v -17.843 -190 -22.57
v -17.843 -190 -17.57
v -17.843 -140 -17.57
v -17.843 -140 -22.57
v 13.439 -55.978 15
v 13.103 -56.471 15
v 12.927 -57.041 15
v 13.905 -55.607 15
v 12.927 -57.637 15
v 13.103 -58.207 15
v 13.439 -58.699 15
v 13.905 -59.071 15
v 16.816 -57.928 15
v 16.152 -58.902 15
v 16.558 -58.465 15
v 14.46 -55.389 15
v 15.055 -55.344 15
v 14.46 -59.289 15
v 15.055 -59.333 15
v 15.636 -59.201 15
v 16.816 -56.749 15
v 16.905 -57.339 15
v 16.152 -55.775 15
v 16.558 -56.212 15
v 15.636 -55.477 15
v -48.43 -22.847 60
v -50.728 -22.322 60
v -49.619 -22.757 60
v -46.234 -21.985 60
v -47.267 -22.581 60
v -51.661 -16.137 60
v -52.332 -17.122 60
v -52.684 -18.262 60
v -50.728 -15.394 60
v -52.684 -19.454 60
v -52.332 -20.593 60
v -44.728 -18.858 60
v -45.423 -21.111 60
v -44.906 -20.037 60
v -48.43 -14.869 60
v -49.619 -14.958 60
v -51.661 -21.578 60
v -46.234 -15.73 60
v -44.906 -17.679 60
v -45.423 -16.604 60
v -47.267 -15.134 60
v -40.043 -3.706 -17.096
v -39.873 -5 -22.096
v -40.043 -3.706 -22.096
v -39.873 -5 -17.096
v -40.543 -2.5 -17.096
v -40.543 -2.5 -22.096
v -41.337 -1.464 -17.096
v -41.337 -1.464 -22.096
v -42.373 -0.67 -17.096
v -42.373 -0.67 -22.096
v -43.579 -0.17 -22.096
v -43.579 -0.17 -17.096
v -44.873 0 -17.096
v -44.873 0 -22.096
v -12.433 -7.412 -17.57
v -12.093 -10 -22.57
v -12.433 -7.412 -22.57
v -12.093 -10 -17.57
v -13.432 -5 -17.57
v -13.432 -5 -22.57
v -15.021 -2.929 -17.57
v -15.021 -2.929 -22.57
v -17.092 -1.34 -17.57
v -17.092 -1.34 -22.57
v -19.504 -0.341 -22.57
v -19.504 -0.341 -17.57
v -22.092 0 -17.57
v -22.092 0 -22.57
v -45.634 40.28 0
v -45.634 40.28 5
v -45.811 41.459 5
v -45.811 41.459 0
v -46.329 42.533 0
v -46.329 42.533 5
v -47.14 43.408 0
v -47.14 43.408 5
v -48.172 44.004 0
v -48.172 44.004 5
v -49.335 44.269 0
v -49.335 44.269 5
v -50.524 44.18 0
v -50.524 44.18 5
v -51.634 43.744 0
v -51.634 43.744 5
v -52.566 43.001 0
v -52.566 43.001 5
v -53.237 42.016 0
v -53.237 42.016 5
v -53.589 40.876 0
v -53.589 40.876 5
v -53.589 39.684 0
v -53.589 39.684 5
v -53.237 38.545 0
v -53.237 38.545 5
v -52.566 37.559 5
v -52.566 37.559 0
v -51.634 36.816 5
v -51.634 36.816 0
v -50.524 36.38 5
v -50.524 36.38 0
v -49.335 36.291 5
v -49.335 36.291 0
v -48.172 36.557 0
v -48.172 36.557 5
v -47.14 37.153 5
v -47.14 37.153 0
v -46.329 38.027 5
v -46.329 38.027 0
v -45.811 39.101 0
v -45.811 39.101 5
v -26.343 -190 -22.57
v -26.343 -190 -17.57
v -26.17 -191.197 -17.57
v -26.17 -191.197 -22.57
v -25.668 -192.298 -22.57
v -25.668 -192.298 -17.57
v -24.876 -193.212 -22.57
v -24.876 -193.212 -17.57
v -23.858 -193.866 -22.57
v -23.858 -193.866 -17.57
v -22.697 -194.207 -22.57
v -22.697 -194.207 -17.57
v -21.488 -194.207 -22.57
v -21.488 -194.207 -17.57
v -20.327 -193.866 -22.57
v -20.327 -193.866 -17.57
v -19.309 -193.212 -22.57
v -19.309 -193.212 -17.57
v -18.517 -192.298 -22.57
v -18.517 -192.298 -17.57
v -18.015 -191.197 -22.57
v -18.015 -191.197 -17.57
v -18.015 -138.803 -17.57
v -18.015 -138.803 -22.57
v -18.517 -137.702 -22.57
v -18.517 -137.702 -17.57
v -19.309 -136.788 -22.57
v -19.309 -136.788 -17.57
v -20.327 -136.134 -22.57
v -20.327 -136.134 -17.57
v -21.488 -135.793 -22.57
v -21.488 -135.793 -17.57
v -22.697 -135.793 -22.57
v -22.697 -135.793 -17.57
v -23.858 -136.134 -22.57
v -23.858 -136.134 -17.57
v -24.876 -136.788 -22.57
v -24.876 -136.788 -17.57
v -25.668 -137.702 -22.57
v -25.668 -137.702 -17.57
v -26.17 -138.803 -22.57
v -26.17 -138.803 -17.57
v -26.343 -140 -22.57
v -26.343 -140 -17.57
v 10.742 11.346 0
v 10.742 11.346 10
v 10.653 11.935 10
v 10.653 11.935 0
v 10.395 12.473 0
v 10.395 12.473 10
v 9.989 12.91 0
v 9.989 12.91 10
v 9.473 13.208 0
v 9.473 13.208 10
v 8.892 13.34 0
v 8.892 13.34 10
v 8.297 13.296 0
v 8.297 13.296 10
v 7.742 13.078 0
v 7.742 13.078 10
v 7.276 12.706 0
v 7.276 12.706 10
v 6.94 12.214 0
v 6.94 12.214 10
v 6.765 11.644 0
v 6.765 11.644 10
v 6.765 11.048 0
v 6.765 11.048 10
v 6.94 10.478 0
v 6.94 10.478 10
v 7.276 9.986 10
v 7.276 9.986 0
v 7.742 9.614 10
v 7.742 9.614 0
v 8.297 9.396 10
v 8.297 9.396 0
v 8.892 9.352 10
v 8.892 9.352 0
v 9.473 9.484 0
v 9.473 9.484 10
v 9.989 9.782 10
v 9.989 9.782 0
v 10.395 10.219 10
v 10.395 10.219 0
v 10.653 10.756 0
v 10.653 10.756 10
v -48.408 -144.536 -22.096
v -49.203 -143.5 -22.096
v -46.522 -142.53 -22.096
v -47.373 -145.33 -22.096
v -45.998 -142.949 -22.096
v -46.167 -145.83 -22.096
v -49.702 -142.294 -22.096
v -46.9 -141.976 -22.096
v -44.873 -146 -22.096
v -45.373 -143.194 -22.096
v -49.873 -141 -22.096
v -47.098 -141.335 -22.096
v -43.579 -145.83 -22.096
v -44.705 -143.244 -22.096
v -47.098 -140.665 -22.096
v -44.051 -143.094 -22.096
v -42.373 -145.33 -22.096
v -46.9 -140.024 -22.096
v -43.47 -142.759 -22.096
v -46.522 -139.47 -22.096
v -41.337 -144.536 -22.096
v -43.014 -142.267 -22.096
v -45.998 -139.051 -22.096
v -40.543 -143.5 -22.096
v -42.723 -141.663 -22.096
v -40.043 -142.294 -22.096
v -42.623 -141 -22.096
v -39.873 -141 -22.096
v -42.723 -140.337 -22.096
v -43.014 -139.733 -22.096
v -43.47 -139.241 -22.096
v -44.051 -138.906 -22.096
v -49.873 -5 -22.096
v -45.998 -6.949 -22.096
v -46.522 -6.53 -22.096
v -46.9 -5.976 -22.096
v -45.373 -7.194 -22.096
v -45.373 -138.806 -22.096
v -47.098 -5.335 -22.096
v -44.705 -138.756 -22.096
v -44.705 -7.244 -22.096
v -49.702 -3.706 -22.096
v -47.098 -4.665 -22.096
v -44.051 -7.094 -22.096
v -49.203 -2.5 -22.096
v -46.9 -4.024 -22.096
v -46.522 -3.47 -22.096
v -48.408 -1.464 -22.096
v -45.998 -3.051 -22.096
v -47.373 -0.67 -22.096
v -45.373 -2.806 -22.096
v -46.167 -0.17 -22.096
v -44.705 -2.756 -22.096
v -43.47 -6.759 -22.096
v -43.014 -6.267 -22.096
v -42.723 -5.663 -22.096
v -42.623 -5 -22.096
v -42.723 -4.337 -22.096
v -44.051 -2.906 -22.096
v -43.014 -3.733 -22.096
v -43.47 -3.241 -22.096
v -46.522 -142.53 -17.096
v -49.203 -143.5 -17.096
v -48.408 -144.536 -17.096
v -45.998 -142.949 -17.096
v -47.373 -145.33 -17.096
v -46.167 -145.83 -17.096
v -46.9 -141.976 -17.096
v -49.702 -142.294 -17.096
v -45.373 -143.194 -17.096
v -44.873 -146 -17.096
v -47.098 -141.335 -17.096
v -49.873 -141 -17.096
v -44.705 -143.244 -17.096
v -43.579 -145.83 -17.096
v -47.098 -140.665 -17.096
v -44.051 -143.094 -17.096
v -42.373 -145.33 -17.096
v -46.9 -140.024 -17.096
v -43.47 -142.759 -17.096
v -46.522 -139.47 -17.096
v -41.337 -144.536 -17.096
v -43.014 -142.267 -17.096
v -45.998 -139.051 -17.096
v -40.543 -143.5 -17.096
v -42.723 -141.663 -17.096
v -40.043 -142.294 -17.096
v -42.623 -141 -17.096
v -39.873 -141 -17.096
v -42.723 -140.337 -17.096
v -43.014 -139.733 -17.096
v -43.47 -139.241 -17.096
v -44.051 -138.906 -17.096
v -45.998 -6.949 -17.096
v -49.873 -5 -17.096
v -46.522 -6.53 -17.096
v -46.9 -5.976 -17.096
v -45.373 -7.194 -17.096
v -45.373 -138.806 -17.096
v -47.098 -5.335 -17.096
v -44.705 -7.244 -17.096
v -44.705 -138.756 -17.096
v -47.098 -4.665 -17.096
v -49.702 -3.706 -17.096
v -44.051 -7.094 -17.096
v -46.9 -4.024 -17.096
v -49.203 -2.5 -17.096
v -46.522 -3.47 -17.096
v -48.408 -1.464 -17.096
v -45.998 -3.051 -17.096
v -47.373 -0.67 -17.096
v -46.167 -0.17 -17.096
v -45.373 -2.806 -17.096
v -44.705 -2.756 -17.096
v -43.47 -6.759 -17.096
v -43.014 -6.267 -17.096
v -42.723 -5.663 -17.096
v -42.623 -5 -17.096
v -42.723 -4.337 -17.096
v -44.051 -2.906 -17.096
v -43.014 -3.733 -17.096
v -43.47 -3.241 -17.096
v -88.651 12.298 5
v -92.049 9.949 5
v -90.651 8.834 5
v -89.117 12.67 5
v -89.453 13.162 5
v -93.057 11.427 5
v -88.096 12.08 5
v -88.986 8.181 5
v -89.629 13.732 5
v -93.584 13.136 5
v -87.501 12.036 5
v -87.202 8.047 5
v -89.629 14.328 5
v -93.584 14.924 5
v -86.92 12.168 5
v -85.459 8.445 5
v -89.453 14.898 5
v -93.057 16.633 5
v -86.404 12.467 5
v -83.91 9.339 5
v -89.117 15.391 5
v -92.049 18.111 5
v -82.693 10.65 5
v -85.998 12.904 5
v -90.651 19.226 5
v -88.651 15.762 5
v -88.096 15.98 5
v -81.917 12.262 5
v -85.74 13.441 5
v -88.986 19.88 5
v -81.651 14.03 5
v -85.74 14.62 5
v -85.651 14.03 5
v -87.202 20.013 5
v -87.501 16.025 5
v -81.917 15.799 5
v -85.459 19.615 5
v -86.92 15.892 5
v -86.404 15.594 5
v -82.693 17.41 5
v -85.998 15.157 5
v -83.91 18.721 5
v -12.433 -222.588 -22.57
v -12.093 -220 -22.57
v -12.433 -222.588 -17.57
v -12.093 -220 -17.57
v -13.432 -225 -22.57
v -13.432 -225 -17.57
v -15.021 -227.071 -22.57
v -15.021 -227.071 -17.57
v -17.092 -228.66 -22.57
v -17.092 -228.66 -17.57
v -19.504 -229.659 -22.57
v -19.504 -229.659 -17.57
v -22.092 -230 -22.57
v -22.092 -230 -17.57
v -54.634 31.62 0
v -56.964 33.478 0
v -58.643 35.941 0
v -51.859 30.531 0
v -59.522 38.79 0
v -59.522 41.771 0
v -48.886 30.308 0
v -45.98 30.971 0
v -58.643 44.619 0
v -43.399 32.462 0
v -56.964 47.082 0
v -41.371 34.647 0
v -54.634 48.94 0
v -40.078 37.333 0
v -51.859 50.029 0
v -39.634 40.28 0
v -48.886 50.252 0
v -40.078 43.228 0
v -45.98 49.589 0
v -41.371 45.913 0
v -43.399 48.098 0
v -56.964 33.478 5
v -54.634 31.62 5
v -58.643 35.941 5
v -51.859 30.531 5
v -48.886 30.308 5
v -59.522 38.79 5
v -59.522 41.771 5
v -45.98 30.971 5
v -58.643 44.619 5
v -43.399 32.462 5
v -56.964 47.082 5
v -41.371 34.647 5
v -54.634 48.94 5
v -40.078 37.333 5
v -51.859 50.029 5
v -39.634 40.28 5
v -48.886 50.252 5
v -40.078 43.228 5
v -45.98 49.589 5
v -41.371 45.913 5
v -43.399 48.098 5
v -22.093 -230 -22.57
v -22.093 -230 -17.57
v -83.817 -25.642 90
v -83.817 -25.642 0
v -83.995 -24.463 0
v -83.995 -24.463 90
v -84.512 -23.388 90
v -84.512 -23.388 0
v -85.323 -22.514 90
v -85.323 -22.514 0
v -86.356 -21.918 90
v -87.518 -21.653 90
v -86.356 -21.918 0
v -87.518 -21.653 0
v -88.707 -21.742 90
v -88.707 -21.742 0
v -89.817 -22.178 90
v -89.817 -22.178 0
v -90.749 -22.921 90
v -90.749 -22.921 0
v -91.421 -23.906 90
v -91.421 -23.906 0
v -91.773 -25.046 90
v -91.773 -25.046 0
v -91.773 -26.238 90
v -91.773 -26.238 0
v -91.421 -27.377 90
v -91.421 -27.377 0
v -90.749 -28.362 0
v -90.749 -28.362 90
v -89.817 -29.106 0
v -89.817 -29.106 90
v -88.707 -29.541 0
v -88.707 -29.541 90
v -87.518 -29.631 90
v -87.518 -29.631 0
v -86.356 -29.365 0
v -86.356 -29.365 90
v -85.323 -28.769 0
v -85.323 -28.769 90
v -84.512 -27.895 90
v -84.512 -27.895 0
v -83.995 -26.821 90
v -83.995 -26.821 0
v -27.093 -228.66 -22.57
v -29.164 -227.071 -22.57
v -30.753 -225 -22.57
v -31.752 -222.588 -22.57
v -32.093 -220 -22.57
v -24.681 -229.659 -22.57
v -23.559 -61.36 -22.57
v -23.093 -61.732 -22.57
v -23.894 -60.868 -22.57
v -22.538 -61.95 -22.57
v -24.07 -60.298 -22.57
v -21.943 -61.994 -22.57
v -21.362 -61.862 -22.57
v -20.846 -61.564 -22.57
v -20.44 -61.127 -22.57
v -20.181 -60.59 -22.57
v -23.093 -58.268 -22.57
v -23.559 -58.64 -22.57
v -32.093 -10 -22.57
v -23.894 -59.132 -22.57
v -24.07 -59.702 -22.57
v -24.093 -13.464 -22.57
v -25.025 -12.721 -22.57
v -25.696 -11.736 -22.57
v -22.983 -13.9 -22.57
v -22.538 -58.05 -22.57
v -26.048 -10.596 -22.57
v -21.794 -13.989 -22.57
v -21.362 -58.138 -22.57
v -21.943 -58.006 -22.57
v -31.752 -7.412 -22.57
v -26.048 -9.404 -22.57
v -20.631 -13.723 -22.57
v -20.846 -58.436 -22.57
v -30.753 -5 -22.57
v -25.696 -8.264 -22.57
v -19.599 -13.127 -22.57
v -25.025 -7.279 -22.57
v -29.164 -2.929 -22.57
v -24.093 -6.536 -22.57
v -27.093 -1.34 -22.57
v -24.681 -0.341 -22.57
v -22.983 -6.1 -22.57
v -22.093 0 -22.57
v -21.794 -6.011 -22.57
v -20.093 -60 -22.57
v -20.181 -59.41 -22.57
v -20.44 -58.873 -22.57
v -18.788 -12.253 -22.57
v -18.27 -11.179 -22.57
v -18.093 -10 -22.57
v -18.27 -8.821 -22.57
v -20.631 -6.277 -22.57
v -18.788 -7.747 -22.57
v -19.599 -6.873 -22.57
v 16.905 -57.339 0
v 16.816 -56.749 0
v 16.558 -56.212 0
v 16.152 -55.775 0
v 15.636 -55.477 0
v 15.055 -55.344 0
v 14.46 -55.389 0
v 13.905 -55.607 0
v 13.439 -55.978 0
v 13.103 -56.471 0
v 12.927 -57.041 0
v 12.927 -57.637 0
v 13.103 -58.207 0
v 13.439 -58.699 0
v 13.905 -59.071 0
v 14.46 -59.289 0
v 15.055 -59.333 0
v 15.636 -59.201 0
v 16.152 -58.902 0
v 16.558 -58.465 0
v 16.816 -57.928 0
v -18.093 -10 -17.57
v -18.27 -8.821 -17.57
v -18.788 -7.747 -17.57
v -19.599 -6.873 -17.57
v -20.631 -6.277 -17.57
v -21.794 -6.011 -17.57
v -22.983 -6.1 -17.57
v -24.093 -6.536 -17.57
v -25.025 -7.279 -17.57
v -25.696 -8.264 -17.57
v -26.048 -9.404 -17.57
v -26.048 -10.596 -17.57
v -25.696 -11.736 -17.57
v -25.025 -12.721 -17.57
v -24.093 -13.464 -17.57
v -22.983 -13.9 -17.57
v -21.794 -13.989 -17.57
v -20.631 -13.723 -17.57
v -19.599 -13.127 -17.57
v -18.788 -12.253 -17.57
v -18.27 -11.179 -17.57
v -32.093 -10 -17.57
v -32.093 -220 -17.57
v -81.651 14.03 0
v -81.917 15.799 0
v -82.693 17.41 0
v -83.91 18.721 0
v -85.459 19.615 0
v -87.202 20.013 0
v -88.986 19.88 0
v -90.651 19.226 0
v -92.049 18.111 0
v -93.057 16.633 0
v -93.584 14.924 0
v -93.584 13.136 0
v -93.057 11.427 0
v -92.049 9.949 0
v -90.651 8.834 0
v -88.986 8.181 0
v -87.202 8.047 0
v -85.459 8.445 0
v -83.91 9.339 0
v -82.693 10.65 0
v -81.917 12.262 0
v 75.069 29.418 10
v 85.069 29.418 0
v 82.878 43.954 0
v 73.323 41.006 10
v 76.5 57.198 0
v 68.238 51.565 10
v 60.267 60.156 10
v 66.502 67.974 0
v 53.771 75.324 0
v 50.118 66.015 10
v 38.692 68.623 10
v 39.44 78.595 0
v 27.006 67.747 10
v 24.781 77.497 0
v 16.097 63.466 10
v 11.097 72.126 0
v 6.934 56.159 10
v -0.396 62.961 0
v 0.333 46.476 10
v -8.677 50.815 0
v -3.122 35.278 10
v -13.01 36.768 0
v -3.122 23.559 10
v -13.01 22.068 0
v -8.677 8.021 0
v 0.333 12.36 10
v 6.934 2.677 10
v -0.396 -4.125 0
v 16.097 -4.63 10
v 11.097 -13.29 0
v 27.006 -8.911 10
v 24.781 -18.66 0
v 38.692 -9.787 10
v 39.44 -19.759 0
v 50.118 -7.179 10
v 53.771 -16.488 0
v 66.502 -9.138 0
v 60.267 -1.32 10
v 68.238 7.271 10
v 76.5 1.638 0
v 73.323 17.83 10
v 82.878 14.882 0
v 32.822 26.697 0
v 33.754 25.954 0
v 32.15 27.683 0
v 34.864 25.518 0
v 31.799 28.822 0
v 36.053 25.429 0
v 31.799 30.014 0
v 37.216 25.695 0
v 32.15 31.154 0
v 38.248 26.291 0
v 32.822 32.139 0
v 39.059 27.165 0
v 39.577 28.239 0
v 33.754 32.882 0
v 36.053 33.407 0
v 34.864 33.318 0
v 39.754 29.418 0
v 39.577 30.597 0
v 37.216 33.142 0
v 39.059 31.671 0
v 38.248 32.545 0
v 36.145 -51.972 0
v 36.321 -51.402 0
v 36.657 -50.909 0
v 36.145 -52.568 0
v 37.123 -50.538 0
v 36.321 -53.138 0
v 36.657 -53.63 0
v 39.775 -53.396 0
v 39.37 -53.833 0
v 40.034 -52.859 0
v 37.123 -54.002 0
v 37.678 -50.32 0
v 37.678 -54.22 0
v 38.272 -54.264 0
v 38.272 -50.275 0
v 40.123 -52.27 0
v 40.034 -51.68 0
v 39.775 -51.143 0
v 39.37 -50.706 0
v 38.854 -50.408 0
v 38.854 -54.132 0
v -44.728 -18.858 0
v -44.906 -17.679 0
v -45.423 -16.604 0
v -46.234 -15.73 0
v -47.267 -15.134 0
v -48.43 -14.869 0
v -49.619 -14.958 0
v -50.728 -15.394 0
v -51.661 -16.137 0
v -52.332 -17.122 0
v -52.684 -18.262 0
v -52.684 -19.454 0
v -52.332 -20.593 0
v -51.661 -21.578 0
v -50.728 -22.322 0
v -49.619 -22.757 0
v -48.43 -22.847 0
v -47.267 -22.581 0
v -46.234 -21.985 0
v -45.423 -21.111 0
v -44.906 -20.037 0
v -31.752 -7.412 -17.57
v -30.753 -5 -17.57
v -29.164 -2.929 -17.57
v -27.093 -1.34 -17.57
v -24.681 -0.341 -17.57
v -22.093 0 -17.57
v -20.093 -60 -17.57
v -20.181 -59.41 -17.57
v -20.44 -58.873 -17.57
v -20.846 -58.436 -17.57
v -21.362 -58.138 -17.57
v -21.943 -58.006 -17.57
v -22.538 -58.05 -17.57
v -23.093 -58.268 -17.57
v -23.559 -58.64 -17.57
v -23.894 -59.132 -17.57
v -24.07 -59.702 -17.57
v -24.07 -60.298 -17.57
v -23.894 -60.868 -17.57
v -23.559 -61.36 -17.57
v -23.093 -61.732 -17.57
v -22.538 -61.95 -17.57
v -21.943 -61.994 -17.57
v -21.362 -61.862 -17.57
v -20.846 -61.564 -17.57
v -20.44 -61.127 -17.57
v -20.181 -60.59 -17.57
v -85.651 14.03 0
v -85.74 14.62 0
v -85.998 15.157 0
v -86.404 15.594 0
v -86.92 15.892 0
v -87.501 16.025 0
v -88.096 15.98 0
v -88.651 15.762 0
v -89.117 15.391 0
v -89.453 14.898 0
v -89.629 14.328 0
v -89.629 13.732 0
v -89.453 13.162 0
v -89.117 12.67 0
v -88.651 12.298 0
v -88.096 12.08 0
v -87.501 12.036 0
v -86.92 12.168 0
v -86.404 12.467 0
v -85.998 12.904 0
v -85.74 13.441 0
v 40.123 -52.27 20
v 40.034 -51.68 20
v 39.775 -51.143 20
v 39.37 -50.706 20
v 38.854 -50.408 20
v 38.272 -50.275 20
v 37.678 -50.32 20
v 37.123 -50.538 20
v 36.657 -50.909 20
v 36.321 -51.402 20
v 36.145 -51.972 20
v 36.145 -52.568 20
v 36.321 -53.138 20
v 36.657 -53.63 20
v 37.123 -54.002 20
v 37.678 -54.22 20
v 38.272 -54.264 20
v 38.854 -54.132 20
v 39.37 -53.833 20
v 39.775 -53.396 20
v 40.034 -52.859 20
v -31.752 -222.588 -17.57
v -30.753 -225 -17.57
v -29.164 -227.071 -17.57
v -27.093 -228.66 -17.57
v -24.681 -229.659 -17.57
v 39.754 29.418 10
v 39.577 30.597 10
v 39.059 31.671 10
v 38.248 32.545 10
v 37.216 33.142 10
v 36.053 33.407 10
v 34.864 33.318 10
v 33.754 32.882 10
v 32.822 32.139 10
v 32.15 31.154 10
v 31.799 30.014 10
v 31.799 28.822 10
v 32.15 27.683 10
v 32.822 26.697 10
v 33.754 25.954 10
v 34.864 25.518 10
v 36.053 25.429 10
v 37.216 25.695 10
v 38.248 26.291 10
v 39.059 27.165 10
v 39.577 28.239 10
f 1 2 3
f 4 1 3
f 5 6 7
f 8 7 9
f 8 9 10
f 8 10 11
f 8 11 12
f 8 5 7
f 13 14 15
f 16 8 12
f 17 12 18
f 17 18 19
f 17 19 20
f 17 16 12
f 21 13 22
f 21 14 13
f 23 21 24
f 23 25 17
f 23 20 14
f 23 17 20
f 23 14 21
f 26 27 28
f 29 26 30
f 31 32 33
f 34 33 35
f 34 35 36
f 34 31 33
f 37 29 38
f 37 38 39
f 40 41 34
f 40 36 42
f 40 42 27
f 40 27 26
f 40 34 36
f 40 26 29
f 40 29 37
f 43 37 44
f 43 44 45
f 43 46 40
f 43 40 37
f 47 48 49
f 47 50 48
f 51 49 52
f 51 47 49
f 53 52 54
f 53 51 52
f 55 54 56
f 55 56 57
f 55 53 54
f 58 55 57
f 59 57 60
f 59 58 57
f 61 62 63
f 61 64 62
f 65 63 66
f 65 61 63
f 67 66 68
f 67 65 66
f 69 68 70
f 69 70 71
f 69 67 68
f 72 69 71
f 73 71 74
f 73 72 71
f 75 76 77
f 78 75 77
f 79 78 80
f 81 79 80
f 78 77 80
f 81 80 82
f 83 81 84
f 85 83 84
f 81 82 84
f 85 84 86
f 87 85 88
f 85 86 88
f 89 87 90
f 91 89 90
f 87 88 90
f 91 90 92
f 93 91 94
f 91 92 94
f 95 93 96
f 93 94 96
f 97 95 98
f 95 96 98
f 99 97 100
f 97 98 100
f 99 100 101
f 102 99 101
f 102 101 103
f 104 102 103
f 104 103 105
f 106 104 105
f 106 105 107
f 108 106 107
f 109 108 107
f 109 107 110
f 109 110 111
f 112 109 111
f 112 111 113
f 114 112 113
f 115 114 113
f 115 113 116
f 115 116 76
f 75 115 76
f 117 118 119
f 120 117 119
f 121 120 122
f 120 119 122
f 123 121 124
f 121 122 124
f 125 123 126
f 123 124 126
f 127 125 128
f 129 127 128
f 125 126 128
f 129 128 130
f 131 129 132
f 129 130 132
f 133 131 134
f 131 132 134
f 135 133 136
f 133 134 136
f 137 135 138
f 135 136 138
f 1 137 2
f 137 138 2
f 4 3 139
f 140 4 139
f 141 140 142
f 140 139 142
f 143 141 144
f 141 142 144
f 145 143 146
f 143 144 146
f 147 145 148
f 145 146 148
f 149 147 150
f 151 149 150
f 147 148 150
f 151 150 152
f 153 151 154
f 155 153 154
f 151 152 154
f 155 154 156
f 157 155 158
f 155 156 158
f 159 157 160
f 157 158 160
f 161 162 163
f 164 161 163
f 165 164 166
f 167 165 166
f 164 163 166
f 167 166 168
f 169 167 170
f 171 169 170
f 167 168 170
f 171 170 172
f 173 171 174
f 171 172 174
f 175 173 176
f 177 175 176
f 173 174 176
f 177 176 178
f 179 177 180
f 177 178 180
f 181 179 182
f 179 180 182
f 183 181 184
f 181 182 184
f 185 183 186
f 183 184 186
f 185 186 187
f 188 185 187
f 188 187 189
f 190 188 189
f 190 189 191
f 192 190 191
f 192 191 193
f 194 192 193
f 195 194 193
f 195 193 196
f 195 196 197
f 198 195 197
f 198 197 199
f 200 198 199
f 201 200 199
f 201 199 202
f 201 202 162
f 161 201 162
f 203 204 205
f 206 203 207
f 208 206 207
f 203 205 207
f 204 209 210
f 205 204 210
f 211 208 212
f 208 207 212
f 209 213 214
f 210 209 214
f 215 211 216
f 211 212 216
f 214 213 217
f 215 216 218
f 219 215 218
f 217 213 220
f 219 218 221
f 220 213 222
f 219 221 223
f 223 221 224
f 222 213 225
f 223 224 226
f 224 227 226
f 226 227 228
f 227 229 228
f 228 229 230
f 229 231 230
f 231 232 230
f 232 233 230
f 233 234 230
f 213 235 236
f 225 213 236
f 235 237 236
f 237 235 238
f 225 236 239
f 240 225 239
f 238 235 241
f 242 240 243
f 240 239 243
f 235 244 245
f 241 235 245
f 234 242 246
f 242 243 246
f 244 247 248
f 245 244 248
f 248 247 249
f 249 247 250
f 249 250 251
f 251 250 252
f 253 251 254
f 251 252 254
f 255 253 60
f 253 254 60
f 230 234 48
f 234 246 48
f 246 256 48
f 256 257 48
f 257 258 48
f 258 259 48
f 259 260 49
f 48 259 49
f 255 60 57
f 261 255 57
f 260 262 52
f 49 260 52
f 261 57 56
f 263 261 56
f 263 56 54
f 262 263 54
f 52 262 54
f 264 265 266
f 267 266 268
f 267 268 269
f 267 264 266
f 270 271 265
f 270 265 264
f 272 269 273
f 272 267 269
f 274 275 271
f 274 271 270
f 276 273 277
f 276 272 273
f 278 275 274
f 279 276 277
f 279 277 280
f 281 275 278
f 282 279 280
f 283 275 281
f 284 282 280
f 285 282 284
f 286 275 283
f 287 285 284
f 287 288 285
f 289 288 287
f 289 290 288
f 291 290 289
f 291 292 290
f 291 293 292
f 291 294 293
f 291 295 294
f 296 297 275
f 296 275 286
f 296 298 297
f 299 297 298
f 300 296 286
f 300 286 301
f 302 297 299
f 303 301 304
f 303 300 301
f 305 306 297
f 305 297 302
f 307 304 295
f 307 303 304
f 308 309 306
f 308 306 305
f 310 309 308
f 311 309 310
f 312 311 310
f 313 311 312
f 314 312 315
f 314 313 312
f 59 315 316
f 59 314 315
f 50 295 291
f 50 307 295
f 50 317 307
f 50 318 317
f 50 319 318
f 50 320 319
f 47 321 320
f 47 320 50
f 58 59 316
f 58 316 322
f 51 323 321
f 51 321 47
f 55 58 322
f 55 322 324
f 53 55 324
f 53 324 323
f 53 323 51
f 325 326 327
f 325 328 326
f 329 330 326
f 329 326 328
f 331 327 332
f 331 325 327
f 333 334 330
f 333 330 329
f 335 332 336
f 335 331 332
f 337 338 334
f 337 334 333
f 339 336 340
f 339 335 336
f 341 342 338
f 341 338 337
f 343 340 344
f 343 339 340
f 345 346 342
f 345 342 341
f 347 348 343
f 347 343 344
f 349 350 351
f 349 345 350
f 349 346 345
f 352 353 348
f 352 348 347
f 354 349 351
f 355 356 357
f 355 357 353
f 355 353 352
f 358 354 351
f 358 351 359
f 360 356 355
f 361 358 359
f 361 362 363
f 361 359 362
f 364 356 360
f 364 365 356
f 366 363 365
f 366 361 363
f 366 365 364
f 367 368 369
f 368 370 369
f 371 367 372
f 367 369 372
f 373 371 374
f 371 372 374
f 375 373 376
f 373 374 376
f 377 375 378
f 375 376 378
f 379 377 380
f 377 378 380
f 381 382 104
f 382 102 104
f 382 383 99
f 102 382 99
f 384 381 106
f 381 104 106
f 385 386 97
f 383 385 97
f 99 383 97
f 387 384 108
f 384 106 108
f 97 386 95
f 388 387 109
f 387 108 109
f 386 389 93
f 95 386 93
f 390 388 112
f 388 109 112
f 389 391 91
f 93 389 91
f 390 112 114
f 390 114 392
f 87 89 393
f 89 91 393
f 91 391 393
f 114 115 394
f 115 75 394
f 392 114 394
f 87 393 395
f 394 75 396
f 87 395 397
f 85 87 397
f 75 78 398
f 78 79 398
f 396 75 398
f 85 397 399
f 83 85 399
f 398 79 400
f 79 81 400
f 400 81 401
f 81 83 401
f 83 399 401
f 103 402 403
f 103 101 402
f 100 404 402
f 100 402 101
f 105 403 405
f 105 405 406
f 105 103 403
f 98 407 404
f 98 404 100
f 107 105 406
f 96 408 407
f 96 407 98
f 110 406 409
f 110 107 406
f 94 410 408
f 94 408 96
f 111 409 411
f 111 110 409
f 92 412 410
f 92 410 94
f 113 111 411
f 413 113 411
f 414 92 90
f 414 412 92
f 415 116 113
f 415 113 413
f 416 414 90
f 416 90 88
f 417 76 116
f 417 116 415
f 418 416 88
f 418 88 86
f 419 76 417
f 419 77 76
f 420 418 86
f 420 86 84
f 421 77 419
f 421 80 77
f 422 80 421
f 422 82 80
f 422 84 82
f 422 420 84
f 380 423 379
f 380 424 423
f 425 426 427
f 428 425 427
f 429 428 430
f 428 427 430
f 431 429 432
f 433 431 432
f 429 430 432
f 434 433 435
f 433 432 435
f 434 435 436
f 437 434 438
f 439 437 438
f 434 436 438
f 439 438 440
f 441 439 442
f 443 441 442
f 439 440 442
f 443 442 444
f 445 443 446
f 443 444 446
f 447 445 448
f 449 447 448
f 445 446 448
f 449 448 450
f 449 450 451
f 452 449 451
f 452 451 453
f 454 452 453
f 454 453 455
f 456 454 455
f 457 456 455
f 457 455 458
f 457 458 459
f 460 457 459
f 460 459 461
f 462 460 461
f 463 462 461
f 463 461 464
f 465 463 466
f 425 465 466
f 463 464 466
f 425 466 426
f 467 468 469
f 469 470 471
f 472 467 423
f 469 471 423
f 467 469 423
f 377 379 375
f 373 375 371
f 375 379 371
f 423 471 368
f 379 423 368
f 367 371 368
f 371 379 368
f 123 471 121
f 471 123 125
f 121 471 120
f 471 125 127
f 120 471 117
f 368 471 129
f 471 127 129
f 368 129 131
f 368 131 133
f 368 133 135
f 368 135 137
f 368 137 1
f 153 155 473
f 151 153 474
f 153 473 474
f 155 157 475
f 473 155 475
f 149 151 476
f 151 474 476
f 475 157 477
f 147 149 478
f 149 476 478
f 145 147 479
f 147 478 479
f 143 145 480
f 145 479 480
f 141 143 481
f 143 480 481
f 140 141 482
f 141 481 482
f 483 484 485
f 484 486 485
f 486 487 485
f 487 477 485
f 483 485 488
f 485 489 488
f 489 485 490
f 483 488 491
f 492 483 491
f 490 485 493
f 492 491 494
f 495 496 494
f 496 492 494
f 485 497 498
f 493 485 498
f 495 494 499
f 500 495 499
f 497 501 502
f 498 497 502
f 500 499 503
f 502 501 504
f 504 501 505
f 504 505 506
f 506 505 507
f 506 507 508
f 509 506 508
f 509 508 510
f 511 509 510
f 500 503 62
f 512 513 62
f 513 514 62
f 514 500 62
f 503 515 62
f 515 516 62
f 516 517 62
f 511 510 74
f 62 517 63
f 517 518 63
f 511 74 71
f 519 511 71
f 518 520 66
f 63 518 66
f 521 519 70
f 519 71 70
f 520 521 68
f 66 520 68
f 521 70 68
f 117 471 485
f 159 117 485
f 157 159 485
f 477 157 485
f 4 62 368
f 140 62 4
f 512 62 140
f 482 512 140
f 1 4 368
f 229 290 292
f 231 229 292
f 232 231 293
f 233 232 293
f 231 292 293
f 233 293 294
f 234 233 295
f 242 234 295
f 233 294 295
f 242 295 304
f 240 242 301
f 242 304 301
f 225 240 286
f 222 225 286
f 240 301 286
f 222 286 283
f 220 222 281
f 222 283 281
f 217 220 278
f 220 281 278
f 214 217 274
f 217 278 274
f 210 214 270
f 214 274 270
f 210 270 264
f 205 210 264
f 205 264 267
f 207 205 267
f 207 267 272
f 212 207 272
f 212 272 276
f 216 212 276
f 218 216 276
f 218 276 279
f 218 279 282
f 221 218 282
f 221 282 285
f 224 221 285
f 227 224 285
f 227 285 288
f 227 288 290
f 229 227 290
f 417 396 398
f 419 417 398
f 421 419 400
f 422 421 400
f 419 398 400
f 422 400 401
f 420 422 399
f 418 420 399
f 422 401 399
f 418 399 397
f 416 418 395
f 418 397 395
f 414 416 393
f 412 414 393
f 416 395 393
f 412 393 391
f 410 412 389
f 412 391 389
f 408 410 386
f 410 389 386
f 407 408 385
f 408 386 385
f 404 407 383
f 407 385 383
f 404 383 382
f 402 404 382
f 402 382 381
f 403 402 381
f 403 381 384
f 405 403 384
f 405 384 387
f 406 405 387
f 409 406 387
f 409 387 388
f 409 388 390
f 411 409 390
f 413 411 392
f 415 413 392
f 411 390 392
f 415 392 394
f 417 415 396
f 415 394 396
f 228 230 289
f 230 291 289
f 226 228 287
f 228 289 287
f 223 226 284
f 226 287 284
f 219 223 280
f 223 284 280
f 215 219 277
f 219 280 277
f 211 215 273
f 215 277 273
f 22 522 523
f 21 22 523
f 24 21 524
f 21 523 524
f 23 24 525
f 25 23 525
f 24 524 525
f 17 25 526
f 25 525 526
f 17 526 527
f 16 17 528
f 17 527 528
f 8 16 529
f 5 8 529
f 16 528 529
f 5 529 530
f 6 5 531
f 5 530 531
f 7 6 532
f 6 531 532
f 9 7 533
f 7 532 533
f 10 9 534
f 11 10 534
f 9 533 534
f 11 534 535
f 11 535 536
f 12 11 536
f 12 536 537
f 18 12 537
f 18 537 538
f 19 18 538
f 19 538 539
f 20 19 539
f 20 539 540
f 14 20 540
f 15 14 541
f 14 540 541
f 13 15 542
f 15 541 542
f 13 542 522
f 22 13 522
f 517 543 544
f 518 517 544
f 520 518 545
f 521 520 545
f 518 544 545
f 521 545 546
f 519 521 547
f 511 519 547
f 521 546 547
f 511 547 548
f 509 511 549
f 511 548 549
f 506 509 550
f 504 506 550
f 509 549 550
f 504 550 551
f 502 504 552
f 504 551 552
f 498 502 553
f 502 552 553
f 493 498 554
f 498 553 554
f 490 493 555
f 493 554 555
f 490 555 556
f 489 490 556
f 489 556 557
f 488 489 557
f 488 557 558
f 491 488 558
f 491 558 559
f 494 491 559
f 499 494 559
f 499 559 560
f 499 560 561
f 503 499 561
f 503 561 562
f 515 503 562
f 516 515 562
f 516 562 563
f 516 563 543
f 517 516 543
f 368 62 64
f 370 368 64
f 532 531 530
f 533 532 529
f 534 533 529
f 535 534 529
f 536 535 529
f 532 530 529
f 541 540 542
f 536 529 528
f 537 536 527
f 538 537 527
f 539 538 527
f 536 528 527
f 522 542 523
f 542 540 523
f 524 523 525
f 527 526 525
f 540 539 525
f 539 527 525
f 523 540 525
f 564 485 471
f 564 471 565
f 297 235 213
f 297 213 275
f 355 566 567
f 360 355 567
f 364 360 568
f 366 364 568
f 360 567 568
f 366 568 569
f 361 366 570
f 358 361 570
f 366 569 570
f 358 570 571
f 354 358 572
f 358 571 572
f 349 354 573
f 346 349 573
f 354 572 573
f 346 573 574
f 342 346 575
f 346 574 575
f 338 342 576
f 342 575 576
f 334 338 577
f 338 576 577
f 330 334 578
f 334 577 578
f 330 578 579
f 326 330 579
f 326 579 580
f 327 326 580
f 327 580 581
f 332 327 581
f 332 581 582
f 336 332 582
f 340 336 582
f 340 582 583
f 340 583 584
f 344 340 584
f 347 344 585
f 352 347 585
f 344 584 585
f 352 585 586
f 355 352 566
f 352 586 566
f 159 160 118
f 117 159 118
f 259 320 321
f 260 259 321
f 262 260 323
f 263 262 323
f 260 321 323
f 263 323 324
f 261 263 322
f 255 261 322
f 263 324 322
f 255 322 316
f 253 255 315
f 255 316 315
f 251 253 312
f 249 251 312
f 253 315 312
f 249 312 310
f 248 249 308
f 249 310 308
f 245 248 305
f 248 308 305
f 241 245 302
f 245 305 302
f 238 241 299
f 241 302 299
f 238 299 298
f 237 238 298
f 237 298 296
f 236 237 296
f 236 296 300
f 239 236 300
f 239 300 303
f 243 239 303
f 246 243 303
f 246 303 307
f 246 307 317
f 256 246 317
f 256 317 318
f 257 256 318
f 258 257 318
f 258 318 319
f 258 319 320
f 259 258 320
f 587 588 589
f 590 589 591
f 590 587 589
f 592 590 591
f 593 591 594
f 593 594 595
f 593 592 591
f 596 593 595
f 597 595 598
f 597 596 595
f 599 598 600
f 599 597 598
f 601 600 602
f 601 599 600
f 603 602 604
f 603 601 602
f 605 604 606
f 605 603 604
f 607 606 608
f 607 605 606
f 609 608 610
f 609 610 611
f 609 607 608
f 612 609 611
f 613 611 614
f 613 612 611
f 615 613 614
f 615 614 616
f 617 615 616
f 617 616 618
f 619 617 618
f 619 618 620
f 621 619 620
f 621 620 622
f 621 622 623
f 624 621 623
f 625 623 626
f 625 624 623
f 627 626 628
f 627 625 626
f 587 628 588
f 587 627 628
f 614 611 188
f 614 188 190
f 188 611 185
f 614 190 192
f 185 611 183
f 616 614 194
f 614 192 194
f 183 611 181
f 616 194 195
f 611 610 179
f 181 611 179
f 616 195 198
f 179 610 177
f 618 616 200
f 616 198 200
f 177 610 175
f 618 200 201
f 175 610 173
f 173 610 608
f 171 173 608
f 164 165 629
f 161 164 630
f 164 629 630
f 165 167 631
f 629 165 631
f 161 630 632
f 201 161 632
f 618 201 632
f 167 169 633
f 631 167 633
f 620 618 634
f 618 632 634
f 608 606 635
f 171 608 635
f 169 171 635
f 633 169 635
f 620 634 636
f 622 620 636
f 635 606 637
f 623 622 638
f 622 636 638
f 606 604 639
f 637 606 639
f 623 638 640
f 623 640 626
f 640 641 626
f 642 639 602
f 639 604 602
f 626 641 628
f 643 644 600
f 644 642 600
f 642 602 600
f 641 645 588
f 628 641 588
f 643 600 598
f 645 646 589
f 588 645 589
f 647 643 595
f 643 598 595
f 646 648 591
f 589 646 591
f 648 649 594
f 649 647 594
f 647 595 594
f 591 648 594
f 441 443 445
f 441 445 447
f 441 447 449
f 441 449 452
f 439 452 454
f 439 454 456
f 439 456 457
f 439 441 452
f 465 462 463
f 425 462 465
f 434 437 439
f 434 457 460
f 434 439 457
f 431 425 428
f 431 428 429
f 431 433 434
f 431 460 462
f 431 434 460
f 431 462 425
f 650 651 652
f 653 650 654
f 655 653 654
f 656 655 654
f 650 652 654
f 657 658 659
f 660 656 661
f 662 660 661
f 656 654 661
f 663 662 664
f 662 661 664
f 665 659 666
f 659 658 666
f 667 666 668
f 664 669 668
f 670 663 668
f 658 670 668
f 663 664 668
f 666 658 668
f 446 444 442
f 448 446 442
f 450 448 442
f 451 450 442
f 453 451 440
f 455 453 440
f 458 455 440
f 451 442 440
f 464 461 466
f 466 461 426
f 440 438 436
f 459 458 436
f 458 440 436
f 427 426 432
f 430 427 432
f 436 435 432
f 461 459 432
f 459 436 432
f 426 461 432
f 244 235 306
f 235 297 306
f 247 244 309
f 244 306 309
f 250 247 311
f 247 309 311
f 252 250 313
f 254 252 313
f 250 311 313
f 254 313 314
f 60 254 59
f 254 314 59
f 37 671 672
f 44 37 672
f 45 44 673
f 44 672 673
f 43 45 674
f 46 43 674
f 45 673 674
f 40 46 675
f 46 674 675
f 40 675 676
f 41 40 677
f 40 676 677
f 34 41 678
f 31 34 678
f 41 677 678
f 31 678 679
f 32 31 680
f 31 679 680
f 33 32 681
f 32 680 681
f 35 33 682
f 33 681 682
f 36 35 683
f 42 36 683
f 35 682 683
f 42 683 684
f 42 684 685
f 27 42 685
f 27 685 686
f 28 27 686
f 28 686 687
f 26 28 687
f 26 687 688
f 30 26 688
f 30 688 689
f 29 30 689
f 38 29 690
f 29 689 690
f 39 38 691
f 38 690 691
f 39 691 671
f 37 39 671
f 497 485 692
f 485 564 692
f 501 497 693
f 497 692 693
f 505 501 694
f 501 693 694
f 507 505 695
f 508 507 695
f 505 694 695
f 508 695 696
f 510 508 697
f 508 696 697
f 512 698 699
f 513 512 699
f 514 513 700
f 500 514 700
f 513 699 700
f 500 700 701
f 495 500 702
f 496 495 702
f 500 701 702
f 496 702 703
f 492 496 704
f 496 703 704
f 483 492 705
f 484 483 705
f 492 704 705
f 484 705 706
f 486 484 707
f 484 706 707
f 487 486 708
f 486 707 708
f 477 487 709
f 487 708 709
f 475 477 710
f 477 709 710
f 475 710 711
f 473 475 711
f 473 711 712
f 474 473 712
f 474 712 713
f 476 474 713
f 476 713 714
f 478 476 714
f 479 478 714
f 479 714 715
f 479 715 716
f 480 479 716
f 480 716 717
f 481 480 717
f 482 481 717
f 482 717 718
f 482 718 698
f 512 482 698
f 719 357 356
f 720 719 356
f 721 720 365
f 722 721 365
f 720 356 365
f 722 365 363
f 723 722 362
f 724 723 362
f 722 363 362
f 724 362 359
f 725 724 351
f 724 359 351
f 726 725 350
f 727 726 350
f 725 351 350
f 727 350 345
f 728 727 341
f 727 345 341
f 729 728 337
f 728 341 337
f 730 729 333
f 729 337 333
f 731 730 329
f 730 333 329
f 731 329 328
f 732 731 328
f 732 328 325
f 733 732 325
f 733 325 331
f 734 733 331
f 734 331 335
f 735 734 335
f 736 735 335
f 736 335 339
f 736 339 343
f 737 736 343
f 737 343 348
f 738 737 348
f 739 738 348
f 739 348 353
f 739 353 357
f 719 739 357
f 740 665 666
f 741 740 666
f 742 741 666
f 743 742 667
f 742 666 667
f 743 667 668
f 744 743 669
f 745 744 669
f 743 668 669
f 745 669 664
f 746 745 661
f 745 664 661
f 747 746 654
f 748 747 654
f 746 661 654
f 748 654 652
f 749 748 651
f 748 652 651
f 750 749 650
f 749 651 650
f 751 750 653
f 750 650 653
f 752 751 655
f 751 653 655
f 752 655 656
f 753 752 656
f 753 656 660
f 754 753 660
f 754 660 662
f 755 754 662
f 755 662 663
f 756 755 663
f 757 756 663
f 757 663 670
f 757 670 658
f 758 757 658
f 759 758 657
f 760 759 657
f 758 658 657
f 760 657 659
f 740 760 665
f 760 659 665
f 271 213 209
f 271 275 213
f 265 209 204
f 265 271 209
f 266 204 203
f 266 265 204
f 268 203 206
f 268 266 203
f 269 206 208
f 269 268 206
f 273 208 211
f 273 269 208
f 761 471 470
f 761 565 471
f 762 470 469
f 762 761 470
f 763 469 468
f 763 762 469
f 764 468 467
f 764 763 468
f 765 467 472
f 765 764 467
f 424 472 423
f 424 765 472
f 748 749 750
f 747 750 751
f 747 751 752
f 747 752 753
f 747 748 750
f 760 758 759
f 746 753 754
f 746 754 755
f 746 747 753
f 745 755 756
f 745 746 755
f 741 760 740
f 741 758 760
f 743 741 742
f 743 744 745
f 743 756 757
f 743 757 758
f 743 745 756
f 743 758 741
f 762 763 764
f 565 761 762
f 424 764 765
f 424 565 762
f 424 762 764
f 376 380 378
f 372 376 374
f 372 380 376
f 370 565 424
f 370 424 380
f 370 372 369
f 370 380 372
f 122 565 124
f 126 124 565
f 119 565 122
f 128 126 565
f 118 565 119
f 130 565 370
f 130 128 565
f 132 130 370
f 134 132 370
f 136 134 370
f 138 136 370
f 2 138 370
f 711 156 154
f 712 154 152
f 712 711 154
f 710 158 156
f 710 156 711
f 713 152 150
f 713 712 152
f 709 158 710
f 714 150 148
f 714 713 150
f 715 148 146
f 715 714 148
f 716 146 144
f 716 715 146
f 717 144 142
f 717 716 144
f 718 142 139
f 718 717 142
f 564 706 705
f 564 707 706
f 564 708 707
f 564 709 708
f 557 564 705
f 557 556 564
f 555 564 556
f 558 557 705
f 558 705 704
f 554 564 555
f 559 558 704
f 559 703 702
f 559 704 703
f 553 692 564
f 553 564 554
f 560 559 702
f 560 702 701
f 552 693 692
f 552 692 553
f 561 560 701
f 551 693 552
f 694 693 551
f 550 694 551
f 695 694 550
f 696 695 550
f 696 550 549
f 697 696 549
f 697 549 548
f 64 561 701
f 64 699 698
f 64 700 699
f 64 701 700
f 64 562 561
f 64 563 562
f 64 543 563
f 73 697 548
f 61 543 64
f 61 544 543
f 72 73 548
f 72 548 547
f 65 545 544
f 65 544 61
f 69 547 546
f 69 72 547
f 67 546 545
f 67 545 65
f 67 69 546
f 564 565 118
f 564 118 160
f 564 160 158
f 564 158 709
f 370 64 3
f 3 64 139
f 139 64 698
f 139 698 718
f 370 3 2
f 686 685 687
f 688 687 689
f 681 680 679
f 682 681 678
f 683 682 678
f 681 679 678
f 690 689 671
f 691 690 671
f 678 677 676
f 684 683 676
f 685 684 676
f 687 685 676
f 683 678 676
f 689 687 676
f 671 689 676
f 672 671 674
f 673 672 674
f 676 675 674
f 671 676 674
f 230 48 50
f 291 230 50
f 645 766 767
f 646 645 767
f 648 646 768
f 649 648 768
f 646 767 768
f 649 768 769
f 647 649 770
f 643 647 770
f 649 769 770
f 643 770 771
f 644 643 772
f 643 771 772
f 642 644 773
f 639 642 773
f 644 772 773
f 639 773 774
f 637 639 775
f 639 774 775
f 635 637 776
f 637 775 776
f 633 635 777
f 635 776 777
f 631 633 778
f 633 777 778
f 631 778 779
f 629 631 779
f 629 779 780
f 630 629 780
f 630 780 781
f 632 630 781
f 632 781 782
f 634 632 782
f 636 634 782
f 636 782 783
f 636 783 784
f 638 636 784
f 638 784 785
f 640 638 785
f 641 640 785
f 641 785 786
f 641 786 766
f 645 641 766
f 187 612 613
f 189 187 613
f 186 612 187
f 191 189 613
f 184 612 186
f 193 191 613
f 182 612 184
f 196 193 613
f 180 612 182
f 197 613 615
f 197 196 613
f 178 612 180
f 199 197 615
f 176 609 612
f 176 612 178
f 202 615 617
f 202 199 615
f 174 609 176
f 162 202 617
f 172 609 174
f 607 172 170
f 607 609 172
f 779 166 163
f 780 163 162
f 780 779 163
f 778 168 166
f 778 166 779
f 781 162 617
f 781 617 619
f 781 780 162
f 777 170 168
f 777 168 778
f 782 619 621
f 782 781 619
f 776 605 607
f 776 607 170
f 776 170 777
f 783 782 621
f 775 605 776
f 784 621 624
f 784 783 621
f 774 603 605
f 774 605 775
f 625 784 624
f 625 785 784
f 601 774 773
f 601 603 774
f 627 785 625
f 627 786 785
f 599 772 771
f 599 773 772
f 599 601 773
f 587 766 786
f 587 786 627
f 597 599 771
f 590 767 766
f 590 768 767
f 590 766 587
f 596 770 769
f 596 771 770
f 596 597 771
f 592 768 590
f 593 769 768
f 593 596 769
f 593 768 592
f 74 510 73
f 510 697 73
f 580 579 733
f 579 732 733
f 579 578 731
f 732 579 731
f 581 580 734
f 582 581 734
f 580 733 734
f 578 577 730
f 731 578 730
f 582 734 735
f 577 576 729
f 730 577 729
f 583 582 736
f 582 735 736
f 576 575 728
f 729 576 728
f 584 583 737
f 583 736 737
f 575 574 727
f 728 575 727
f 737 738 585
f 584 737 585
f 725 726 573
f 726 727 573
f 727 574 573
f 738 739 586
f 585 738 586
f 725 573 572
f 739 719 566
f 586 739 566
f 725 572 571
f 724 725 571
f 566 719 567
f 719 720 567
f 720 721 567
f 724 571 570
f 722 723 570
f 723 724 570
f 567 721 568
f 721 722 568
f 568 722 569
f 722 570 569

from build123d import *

# Parameters (mm, degrees)
F0_R      = 49.315
F1_DEPTH  = 10
F2_SIZE   = 9.99999
F3_R      = 4
F3_R_2    = 2
F4_DEPTH  = 10.001
F5_R      = 10
F6_DEPTH  = 5
F5_R_2    = 6
F7_R      = 4
F8_DEPTH  = 5.001
F9_R      = 4
F10_DEPTH = 60
F11_R     = 2
F12_DEPTH = 5.001
F13_W     = 10
F13_H     = 5
F14_DEPTH = 146
F15_R     = 4.99999
F16_R     = 2.25
F17_DEPTH = 5.001
F18_W     = 20
F18_H     = 5
F19_DEPTH = 230
F20_R     = 9.99999
F21_R     = 4
F22_DEPTH = 5.001
F23_R     = 2
F24_DEPTH = 5.001
F25_R     = 4
F26_DEPTH = 90
F27_R     = 2
F28_DEPTH = 15
F29_R     = 2
F30_DEPTH = 20


# Not quite as in the source:
# - a fillet or chamfer is up to 0.001 mm smaller than in the source, because OpenCascade refuses the exact size


with BuildPart() as f1:
    # F0 (on Top) → F1 (new body)
    with BuildSketch(Plane.XY):
        with Locations((35.7543155551, 29.4181052595)):
            Circle(F0_R)
    extrude(amount=F1_DEPTH)

    # F2 (size 10 in the source; OpenCascade refuses exactly that, so slightly less here)
    f2_edges = [f1.edges().sort_by_distance(p)[0] for p in [
        (-13.560684, 29.418105, 10),
    ]]
    chamfer(f2_edges, length=F2_SIZE)

    # F3 (on face) → F4 (cut, through all)
    with BuildSketch(Plane.XY.offset(10)):
        with Locations((35.7543155551, 29.4181052595)):
            Circle(F3_R)
        with Locations((8.7423292544, 11.3459555233)):
            Circle(F3_R_2)
    extrude(amount=-F4_DEPTH, mode=Mode.SUBTRACT)


with BuildPart() as f6:
    # F5 (on Top) → F6 (new body)
    with BuildSketch(Plane.XY):
        with Locations((-49.6336221695, 40.280174464)):
            Circle(F5_R)
    extrude(amount=F6_DEPTH)

    # F7 (on face) → F8 (cut, through all)
    with BuildSketch(Plane.XY.offset(5)):
        with Locations((-49.6336221695, 40.280174464)):
            Circle(F7_R)
    extrude(amount=-F8_DEPTH, mode=Mode.SUBTRACT)


with BuildPart() as f6b:
    # F5 (on Top) → F6, piece 2 (new body)
    with BuildSketch(Plane.XY):
        with Locations((-87.6508653164, 14.0301734209)):
            Circle(F5_R_2)
    extrude(amount=F6_DEPTH)

    # F11 (on face) → F12 (cut, through all)
    with BuildSketch(Plane.XY.offset(5)):
        with Locations((-87.6508653164, 14.0301734209)):
            Circle(F11_R)
    extrude(amount=-F12_DEPTH, mode=Mode.SUBTRACT)


with BuildPart() as f10:
    # F9 (on Top) → F10 (new body)
    with BuildSketch(Plane.XY):
        with Locations((-48.7284511328, -18.8577584922)):
            Circle(F9_R)
    extrude(amount=F10_DEPTH)


with BuildPart() as f14:
    # F13 (on Front) → F14 (new body)
    with BuildSketch(Plane.XZ):
        with Locations((-44.8726732284, -19.596266548)):
            Rectangle(F13_W, F13_H)
    extrude(amount=F14_DEPTH)

    # F15 (radius 5 in the source; OpenCascade refuses exactly that, so slightly less here)
    f15_edges = [f14.edges().sort_by_distance(p)[0] for p in [
        (-49.872673, -146, -19.596267),
        (-39.872673, -146, -19.596267),
        (-39.872673, 0, -19.596267),
        (-49.872673, 0, -19.596267),
    ]]
    fillet(f15_edges, radius=F15_R)

    # F16 (on face) → F17 (cut, through all)
    with BuildSketch(Plane.XY.offset(-17.096266548)):
        with Locations((-44.8726732284, -5)):
            Circle(F16_R)
        with Locations((-44.8726732284, -141)):
            Circle(F16_R)
    extrude(amount=-F17_DEPTH, mode=Mode.SUBTRACT)


with BuildPart() as f19:
    # F18 (on Front) → F19 (new body)
    with BuildSketch(Plane.XZ):
        with Locations((-22.0925002359, -20.0699501518)):
            Rectangle(F18_W, F18_H)
    extrude(amount=F19_DEPTH)

    # F20 (radius 10 in the source; OpenCascade refuses exactly that, so slightly less here)
    f20_edges = [f19.edges().sort_by_distance(p)[0] for p in [
        (-32.0925, -230, -20.06995),
        (-12.0925, -230, -20.06995),
        (-32.0925, 0, -20.06995),
        (-12.0925, 0, -20.06995),
    ]]
    fillet(f20_edges, radius=F20_R)

    # F21 (on face) → F22 (cut, through all)
    with BuildSketch(Plane.XY.offset(-17.5699501518)):
        with Locations((-22.0925002359, -10)):
            Circle(F21_R)
        with BuildLine():
            ThreePointArc((-26.3425002359, -140), (-22.0925002359, -144.25), (-17.8425002359, -140))
            ThreePointArc((-17.8425002359, -140), (-22.0925002359, -135.75), (-26.3425002359, -140))
        make_face()
        with BuildLine():
            Line((-17.8425002359, -190), (-17.8425002359, -140))
            ThreePointArc((-17.8425002359, -140), (-22.0925002359, -144.25), (-26.3425002359, -140))
            Line((-26.3425002359, -140), (-26.3425002359, -190))
            ThreePointArc((-26.3425002359, -190), (-22.0925002359, -185.75), (-17.8425002359, -190))
        make_face()
        with BuildLine():
            ThreePointArc((-26.3425002359, -190), (-22.0925002359, -194.25), (-17.8425002359, -190))
            ThreePointArc((-17.8425002359, -190), (-22.0925002359, -185.75), (-26.3425002359, -190))
        make_face()
    extrude(amount=-F22_DEPTH, mode=Mode.SUBTRACT)

    # F23 (on face) → F24 (cut, through all)
    with BuildSketch(Plane.XY.offset(-17.5699501518)):
        with Locations((-22.0925002359, -60)):
            Circle(F23_R)
    extrude(amount=-F24_DEPTH, mode=Mode.SUBTRACT)


with BuildPart() as f26:
    # F25 (on Top) → F26 (new body)
    with BuildSketch(Plane.XY):
        with Locations((-87.817274034, -25.6417505443)):
            Circle(F25_R)
    extrude(amount=F26_DEPTH)


with BuildPart() as f28:
    # F27 (on Top) → F28 (new body)
    with BuildSketch(Plane.XY):
        with Locations((14.9050457403, -57.3387555778)):
            Circle(F27_R)
    extrude(amount=F28_DEPTH)


with BuildPart() as f30:
    # F29 (on Top) → F30 (new body)
    with BuildSketch(Plane.XY):
        with Locations((38.122959435, -52.2697754204)):
            Circle(F29_R)
    extrude(amount=F30_DEPTH)


solid = Compound([f1.part, f6.part, f6b.part, f10.part, f14.part, f19.part, f26.part, f28.part, f30.part])
